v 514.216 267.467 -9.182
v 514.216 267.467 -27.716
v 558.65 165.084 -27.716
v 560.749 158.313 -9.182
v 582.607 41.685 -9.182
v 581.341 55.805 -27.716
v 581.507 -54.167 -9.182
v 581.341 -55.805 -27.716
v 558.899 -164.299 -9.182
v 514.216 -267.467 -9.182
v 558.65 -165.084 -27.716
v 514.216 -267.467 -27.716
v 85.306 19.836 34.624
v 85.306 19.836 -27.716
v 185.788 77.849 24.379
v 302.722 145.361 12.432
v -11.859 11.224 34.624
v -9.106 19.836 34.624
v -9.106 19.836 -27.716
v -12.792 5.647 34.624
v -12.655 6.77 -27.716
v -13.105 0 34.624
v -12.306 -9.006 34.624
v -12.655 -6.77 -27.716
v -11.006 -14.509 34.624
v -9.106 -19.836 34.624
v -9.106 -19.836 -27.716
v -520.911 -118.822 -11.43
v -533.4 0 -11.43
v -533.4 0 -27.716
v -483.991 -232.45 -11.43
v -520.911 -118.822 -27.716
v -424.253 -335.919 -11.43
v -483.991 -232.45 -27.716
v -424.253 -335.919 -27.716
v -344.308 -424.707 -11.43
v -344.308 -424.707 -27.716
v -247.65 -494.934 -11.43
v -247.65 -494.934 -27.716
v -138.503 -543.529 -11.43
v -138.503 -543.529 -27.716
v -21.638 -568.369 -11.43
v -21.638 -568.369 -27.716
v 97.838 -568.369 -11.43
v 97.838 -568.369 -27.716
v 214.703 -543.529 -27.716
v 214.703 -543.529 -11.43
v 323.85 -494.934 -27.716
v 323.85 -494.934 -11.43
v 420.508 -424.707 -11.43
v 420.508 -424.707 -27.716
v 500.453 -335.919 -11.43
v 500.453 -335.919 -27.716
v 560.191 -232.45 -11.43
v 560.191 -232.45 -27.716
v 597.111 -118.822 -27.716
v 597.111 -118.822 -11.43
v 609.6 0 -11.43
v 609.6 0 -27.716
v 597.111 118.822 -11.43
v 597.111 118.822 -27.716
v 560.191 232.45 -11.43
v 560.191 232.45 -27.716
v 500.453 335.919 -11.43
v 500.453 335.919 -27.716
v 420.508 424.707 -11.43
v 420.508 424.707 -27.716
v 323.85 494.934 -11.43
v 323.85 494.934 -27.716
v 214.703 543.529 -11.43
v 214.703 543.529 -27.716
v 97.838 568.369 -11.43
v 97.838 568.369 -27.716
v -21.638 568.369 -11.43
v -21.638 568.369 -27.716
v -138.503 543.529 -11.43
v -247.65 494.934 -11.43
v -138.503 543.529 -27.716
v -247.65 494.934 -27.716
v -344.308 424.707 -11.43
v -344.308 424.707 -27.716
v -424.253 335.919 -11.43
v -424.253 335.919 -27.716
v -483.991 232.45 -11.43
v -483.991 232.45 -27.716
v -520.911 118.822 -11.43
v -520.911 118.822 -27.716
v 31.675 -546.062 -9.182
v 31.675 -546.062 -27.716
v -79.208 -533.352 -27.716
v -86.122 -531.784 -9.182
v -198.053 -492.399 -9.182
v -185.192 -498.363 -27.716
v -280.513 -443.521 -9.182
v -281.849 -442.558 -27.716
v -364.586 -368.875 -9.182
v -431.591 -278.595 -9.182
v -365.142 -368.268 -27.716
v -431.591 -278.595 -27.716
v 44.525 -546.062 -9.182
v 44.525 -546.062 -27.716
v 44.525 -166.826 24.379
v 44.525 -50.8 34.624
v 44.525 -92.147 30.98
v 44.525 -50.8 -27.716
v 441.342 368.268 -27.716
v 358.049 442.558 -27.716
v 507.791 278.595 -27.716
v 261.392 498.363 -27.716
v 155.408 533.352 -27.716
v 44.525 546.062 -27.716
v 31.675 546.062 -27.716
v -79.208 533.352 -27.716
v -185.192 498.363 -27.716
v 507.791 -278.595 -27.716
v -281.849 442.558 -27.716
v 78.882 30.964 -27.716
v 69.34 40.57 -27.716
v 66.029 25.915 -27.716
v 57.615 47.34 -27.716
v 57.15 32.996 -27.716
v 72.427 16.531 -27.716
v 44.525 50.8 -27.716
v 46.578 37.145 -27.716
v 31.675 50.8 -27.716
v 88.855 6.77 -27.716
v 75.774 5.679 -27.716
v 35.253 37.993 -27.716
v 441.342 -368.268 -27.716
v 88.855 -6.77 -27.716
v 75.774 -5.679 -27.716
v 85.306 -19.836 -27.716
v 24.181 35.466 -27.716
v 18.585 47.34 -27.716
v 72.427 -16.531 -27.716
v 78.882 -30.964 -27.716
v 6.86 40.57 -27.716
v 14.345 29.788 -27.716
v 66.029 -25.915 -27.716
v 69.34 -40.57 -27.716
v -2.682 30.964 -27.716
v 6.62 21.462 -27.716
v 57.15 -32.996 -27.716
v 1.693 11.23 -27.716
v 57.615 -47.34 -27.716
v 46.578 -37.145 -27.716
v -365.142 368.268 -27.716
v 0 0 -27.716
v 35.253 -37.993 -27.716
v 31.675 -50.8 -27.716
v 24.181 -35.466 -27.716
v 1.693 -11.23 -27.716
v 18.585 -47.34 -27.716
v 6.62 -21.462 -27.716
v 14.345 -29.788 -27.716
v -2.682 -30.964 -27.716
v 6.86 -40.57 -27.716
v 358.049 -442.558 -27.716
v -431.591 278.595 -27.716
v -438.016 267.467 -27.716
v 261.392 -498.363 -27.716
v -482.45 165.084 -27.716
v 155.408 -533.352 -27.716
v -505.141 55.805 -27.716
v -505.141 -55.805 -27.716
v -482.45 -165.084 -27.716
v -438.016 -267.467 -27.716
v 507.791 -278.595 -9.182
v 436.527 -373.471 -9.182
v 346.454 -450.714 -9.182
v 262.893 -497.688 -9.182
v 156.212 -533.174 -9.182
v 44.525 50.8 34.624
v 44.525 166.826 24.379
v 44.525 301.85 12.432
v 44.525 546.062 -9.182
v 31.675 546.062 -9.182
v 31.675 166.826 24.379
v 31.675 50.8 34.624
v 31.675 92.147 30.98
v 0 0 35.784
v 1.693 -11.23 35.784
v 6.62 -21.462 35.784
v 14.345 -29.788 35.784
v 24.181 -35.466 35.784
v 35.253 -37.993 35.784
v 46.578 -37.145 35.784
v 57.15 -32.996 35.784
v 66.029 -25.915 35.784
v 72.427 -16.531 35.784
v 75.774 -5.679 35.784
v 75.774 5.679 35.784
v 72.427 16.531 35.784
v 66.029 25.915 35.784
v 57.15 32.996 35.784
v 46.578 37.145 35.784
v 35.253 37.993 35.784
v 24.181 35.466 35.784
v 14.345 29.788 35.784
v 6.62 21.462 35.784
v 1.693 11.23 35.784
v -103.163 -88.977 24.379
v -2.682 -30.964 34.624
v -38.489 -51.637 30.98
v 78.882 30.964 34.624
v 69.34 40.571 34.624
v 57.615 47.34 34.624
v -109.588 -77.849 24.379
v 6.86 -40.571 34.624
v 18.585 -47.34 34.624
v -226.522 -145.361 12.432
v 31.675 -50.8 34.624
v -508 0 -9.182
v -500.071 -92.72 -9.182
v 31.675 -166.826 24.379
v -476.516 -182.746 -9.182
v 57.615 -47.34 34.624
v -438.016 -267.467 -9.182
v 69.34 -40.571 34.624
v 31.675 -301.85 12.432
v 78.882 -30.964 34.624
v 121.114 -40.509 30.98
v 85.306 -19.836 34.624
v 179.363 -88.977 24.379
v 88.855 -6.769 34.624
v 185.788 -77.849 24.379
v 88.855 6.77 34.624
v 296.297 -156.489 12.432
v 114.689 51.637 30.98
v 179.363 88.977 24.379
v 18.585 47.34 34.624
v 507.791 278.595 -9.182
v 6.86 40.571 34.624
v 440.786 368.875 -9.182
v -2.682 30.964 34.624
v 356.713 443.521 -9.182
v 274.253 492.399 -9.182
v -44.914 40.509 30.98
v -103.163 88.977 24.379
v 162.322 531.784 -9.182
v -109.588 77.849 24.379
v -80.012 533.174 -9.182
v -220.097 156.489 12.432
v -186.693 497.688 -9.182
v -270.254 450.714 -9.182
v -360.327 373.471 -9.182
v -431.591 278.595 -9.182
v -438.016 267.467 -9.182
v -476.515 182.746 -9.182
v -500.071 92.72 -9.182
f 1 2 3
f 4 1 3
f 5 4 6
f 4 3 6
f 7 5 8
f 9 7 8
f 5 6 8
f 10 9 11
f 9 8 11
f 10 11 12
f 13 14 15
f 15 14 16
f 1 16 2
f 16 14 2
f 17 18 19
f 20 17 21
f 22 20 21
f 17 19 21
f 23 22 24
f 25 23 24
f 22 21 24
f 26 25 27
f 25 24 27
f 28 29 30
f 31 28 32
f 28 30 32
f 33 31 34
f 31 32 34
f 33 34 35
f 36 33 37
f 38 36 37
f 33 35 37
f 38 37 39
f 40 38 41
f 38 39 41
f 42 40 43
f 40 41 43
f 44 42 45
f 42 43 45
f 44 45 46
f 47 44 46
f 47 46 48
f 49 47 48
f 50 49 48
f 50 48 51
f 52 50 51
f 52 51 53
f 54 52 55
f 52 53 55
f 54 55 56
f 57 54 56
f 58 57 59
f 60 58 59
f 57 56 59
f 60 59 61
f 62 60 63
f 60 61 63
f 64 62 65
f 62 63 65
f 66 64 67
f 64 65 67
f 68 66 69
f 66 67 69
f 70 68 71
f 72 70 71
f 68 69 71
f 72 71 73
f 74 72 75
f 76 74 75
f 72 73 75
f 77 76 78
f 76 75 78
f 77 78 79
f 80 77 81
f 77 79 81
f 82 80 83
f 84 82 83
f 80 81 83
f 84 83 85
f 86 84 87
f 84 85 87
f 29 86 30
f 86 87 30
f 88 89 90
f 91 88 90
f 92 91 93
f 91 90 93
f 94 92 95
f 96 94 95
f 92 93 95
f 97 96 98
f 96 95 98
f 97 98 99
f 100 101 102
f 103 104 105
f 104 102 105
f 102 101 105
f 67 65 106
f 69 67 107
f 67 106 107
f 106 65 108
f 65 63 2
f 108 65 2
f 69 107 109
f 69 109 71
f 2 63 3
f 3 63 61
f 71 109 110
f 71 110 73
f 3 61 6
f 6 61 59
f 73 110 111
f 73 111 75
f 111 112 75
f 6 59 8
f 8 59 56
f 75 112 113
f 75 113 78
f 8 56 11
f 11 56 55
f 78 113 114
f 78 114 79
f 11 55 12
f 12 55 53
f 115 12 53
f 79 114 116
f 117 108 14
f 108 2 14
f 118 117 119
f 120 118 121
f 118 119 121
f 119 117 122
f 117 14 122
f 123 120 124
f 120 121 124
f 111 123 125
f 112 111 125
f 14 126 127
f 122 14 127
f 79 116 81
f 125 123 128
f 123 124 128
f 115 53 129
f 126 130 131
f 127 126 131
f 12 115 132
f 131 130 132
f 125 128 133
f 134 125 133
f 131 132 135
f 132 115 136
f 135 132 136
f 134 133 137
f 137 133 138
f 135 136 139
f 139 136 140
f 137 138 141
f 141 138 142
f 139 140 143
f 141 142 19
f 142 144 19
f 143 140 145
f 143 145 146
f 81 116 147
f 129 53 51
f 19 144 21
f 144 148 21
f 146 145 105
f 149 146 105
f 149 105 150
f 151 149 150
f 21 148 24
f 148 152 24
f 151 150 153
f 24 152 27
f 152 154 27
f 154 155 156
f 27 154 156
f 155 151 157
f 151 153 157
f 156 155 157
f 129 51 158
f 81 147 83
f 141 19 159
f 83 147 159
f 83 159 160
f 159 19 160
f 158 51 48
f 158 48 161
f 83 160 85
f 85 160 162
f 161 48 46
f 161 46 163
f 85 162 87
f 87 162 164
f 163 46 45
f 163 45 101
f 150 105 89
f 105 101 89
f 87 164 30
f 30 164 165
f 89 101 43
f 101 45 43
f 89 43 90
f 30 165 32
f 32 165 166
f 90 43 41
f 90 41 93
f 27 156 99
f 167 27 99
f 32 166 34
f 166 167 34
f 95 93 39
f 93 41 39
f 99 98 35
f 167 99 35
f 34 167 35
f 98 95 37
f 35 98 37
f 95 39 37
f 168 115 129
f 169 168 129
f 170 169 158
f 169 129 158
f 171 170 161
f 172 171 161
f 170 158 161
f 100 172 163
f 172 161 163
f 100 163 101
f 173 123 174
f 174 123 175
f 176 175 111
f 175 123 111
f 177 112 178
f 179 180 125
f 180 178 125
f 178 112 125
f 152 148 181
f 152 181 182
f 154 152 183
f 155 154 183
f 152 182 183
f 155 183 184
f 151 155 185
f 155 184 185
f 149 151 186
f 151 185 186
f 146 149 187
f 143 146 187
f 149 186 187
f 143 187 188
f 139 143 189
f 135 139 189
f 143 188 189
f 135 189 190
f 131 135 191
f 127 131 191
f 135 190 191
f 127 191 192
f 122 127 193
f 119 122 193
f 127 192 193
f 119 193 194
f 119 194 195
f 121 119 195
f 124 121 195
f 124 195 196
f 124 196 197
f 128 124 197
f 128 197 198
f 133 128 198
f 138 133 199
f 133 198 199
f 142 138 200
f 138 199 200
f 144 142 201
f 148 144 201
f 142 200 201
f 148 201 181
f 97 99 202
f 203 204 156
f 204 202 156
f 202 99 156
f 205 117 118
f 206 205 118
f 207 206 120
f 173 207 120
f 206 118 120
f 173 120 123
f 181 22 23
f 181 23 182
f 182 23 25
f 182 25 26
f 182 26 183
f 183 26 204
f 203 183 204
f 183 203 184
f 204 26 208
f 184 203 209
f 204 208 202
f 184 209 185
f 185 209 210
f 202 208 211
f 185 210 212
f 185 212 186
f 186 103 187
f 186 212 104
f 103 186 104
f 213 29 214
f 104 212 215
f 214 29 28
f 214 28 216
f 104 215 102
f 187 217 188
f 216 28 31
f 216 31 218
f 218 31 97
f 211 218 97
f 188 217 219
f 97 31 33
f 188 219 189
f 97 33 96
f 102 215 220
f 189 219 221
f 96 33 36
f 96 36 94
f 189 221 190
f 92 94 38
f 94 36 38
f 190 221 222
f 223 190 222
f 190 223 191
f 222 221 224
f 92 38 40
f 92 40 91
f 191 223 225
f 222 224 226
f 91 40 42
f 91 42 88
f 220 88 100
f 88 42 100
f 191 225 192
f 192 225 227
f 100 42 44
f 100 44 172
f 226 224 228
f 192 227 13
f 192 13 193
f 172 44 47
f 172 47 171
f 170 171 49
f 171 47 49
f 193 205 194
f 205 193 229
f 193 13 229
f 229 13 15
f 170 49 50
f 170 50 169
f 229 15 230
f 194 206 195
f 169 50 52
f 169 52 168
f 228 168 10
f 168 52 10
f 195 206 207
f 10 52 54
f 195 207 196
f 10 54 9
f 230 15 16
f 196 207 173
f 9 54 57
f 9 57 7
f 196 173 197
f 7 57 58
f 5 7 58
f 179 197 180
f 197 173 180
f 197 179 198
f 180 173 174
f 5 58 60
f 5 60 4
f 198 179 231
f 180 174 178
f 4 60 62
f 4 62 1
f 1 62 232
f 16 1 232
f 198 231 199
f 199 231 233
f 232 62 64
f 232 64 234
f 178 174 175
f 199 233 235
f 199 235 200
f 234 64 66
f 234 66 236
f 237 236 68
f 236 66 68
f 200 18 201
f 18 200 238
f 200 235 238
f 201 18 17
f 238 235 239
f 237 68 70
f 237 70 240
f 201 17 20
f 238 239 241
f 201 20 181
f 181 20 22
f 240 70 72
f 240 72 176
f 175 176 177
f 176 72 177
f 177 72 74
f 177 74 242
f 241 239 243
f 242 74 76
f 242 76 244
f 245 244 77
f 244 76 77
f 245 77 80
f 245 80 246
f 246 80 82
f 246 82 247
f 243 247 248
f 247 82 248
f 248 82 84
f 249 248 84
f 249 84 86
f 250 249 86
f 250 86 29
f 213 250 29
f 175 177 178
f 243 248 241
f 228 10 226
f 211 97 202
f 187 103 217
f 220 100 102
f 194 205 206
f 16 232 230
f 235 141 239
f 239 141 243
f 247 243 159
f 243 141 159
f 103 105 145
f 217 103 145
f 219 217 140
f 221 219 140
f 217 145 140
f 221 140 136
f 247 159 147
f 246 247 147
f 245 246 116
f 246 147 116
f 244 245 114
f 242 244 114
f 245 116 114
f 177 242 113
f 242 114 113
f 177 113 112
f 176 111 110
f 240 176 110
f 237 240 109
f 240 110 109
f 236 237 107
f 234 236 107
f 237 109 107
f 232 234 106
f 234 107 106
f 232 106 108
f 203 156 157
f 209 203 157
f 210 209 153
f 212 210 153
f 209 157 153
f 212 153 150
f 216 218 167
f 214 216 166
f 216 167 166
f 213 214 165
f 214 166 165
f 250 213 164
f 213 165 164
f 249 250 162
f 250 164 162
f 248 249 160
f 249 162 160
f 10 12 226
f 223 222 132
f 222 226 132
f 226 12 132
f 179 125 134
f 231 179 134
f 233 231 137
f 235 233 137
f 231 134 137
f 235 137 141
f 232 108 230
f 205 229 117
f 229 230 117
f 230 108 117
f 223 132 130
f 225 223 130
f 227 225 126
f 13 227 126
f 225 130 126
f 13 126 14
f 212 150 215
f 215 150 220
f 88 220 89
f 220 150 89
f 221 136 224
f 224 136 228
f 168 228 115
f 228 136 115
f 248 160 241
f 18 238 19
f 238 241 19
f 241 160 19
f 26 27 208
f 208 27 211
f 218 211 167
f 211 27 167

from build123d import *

# Parameters (mm, degrees)
CUT_EXTRUDE1_DEPTH = 127
SKETCH3_R          = 6.35
CUT_EXTRUDE2_DEPTH = 127


with BuildPart() as part:
    # Sketch1 → Revolve1 (revolve)
    with BuildSketch(Plane(origin=(0, 0, 0), x_dir=(1, 0, 0), z_dir=(0, 1, 0))):
        Polygon((0, 27.715882353), (0, -35.784117647), (-533.4, 11.43), (-533.4, 27.715882353), align=None)
    revolve(axis=Axis((38.1, 0, -15.015882353), (0, 0, 1)))

    # Sketch2 → Cut-Extrude1 (cut)
    with BuildSketch(Plane(origin=(0, 0, -27.715882353), x_dir=(-1, 0, 0), z_dir=(0, 0, -1))):
        with BuildLine():
            ThreePointArc((-85.306443453, -19.836041494), (-89.304656484, 0), (-85.306443453, 19.836041494))
            Line((-85.306443453, 19.836041494), (-514.216095648, 267.467144646))
            ThreePointArc((-514.216095648, 267.467144646), (-584.2, 0), (-514.216095648, -267.467144646))
            Line((-514.216095648, -267.467144646), (-85.306443453, -19.836041494))
        make_face()
        with BuildLine():
            ThreePointArc((-78.881737571, 30.963958506), (-63.702328242, 44.344533307), (-44.524705882, 50.8))
            Line((-44.524705882, 50.8), (-44.524705882, 546.062206305))
            ThreePointArc((-44.524705882, 546.062206305), (-311.15, 472.936473007), (-507.791389765, 278.595061658))
            Line((-507.791389765, 278.595061658), (-78.881737571, 30.963958506))
        make_face()
        with BuildLine():
            Line((-31.675294118, 546.062206305), (-31.675294118, 50.8))
            ThreePointArc((-31.675294118, 50.8), (-12.497671758, 44.344533307), (2.681737571, 30.963958506))
            Line((2.681737571, 30.963958506), (431.591389765, 278.595061658))
            ThreePointArc((431.591389765, 278.595061658), (234.95, 472.936473007), (-31.675294118, 546.062206305))
        make_face()
        with BuildLine():
            ThreePointArc((9.106443453, 19.836041494), (13.104656484, 0), (9.106443453, -19.836041494))
            Line((9.106443453, -19.836041494), (438.016095648, -267.467144646))
            ThreePointArc((438.016095648, -267.467144646), (508, 0), (438.016095648, 267.467144646))
            Line((438.016095648, 267.467144646), (9.106443453, 19.836041494))
        make_face()
        with BuildLine():
            ThreePointArc((2.681737571, -30.963958506), (-12.497671758, -44.344533307), (-31.675294118, -50.8))
            Line((-31.675294118, -50.8), (-31.675294118, -546.062206305))
            ThreePointArc((-31.675294118, -546.062206305), (234.95, -472.936473007), (431.591389765, -278.595061658))
            Line((431.591389765, -278.595061658), (2.681737571, -30.963958506))
        make_face()
        with BuildLine():
            ThreePointArc((-44.524705882, -50.8), (-63.702328242, -44.344533307), (-78.881737571, -30.963958506))
            Line((-78.881737571, -30.963958506), (-507.791389765, -278.595061658))
            ThreePointArc((-507.791389765, -278.595061658), (-311.15, -472.936473007), (-44.524705882, -546.062206305))
            Line((-44.524705882, -546.062206305), (-44.524705882, -50.8))
        make_face()
    extrude(amount=-CUT_EXTRUDE1_DEPTH, mode=Mode.SUBTRACT)

    # Sketch3 → Cut-Extrude2 (cut)
    with BuildSketch(Plane.XY):
        with Locations((982.963055161, 544.767048731)):
            Circle(SKETCH3_R)
        with Locations((963.263630927, -578.887452386)):
            Circle(SKETCH3_R)
        with Locations((-19.699424235, -1123.654501117)):
            Circle(SKETCH3_R)
        with Locations((-982.963055161, -544.767048731)):
            Circle(SKETCH3_R)
        with Locations((-963.263630927, 578.887452386)):
            Circle(SKETCH3_R)
        with Locations((19.699424235, 1123.654501117)):
            Circle(SKETCH3_R)
    extrude(amount=-CUT_EXTRUDE2_DEPTH, mode=Mode.SUBTRACT)


solid = part.part
